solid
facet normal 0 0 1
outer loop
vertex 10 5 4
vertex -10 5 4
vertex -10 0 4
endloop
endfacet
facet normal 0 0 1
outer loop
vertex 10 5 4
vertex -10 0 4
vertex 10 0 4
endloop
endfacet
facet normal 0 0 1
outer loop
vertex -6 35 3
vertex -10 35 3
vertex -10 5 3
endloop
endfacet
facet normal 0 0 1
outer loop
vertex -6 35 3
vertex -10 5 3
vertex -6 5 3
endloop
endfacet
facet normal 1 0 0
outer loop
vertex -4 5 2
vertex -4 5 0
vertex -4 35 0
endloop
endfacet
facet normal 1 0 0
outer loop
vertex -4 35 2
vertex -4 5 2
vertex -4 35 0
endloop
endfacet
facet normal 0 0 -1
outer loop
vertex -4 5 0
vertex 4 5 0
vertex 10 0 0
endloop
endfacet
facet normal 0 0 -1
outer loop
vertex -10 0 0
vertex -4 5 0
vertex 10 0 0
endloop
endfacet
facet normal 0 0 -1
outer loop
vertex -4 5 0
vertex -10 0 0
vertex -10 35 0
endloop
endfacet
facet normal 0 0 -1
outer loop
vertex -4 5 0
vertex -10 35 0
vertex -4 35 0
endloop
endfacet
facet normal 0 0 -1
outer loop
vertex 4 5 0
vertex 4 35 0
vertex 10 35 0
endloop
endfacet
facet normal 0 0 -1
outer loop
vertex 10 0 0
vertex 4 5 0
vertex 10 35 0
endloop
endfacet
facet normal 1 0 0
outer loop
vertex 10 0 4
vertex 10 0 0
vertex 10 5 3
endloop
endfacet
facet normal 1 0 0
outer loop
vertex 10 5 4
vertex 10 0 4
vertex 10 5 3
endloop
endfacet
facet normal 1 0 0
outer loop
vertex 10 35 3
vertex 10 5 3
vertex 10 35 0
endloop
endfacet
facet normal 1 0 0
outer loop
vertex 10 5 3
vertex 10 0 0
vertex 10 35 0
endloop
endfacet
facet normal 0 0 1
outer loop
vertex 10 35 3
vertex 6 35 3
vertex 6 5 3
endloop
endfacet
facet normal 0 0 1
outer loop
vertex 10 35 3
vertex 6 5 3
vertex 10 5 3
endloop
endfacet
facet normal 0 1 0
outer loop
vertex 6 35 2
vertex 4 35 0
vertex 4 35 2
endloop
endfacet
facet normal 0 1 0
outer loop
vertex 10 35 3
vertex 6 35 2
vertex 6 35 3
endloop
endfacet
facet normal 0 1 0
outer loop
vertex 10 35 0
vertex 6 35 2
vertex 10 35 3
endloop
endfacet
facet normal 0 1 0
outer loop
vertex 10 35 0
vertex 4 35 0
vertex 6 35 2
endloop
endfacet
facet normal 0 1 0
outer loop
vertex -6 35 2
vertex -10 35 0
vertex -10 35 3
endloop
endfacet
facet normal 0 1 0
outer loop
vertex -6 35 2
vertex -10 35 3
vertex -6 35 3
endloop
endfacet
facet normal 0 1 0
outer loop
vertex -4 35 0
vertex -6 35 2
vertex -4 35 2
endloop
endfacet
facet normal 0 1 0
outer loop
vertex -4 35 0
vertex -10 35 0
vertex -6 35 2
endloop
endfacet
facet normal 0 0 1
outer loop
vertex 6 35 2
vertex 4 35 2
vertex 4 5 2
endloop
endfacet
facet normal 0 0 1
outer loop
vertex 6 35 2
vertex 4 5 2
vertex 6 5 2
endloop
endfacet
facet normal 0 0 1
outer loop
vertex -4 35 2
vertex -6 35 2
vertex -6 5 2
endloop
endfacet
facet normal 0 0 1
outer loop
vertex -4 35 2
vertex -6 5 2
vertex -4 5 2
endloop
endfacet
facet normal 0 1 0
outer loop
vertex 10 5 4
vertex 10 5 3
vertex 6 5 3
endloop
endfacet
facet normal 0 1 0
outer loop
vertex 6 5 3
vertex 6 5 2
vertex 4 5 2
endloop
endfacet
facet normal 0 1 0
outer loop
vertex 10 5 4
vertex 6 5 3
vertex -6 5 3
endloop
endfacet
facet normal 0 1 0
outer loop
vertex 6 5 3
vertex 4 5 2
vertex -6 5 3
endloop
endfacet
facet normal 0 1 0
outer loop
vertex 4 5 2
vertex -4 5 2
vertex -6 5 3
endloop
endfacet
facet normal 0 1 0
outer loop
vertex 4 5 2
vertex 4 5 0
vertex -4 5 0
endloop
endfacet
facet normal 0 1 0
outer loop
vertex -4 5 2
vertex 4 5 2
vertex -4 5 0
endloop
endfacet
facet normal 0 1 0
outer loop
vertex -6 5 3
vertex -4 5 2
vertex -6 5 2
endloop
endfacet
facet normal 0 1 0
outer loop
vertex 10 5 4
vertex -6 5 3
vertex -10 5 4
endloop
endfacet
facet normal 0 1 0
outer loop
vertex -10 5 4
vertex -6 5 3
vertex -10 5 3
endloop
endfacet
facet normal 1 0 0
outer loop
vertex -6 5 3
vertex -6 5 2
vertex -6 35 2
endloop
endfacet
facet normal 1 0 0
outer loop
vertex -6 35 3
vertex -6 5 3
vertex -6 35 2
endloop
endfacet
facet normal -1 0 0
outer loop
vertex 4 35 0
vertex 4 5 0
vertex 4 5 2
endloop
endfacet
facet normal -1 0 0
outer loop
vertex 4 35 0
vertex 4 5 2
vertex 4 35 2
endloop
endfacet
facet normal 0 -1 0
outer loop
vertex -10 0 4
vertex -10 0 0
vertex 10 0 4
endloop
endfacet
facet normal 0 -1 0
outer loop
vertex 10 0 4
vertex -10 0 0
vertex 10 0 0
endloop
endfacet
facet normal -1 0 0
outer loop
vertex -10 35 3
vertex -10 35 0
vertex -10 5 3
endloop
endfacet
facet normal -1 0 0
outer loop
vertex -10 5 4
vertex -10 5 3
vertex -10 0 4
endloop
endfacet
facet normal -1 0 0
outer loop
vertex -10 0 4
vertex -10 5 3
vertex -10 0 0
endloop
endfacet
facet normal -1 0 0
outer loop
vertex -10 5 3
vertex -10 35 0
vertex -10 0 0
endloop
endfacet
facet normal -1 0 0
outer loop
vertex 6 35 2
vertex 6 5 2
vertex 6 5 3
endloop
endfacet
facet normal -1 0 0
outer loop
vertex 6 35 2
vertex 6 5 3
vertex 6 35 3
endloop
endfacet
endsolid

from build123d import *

# Parameters (mm, degrees)
F1_DEPTH = 4
F0_W     = 2
F0_H     = 30
F2_DEPTH = 2
F0_W_2   = 4
F3_DEPTH = 3


with BuildPart() as f1:
    # F0 (on Top) → F1 (new body)
    with BuildSketch(Plane.XY):
        Polygon((-6, 5), (-10, 5), (-10, 0), (10, 0), (10, 5), (6, 5), (4, 5), (-4, 5), align=None)
    extrude(amount=F1_DEPTH)

    # F0 (on Top) → F2 (join)
    with BuildSketch(Plane.XY):
        with Locations((-5, 20)):
            Rectangle(F0_W, F0_H)
        with Locations((5, 20)):
            Rectangle(F0_W, F0_H)
    extrude(amount=F2_DEPTH)

    # F0 (on Top) → F3 (join)
    with BuildSketch(Plane.XY):
        with Locations((8, 20)):
            Rectangle(F0_W_2, F0_H)
        with Locations((-8, 20)):
            Rectangle(F0_W_2, F0_H)
    extrude(amount=F3_DEPTH)


solid = f1.part
